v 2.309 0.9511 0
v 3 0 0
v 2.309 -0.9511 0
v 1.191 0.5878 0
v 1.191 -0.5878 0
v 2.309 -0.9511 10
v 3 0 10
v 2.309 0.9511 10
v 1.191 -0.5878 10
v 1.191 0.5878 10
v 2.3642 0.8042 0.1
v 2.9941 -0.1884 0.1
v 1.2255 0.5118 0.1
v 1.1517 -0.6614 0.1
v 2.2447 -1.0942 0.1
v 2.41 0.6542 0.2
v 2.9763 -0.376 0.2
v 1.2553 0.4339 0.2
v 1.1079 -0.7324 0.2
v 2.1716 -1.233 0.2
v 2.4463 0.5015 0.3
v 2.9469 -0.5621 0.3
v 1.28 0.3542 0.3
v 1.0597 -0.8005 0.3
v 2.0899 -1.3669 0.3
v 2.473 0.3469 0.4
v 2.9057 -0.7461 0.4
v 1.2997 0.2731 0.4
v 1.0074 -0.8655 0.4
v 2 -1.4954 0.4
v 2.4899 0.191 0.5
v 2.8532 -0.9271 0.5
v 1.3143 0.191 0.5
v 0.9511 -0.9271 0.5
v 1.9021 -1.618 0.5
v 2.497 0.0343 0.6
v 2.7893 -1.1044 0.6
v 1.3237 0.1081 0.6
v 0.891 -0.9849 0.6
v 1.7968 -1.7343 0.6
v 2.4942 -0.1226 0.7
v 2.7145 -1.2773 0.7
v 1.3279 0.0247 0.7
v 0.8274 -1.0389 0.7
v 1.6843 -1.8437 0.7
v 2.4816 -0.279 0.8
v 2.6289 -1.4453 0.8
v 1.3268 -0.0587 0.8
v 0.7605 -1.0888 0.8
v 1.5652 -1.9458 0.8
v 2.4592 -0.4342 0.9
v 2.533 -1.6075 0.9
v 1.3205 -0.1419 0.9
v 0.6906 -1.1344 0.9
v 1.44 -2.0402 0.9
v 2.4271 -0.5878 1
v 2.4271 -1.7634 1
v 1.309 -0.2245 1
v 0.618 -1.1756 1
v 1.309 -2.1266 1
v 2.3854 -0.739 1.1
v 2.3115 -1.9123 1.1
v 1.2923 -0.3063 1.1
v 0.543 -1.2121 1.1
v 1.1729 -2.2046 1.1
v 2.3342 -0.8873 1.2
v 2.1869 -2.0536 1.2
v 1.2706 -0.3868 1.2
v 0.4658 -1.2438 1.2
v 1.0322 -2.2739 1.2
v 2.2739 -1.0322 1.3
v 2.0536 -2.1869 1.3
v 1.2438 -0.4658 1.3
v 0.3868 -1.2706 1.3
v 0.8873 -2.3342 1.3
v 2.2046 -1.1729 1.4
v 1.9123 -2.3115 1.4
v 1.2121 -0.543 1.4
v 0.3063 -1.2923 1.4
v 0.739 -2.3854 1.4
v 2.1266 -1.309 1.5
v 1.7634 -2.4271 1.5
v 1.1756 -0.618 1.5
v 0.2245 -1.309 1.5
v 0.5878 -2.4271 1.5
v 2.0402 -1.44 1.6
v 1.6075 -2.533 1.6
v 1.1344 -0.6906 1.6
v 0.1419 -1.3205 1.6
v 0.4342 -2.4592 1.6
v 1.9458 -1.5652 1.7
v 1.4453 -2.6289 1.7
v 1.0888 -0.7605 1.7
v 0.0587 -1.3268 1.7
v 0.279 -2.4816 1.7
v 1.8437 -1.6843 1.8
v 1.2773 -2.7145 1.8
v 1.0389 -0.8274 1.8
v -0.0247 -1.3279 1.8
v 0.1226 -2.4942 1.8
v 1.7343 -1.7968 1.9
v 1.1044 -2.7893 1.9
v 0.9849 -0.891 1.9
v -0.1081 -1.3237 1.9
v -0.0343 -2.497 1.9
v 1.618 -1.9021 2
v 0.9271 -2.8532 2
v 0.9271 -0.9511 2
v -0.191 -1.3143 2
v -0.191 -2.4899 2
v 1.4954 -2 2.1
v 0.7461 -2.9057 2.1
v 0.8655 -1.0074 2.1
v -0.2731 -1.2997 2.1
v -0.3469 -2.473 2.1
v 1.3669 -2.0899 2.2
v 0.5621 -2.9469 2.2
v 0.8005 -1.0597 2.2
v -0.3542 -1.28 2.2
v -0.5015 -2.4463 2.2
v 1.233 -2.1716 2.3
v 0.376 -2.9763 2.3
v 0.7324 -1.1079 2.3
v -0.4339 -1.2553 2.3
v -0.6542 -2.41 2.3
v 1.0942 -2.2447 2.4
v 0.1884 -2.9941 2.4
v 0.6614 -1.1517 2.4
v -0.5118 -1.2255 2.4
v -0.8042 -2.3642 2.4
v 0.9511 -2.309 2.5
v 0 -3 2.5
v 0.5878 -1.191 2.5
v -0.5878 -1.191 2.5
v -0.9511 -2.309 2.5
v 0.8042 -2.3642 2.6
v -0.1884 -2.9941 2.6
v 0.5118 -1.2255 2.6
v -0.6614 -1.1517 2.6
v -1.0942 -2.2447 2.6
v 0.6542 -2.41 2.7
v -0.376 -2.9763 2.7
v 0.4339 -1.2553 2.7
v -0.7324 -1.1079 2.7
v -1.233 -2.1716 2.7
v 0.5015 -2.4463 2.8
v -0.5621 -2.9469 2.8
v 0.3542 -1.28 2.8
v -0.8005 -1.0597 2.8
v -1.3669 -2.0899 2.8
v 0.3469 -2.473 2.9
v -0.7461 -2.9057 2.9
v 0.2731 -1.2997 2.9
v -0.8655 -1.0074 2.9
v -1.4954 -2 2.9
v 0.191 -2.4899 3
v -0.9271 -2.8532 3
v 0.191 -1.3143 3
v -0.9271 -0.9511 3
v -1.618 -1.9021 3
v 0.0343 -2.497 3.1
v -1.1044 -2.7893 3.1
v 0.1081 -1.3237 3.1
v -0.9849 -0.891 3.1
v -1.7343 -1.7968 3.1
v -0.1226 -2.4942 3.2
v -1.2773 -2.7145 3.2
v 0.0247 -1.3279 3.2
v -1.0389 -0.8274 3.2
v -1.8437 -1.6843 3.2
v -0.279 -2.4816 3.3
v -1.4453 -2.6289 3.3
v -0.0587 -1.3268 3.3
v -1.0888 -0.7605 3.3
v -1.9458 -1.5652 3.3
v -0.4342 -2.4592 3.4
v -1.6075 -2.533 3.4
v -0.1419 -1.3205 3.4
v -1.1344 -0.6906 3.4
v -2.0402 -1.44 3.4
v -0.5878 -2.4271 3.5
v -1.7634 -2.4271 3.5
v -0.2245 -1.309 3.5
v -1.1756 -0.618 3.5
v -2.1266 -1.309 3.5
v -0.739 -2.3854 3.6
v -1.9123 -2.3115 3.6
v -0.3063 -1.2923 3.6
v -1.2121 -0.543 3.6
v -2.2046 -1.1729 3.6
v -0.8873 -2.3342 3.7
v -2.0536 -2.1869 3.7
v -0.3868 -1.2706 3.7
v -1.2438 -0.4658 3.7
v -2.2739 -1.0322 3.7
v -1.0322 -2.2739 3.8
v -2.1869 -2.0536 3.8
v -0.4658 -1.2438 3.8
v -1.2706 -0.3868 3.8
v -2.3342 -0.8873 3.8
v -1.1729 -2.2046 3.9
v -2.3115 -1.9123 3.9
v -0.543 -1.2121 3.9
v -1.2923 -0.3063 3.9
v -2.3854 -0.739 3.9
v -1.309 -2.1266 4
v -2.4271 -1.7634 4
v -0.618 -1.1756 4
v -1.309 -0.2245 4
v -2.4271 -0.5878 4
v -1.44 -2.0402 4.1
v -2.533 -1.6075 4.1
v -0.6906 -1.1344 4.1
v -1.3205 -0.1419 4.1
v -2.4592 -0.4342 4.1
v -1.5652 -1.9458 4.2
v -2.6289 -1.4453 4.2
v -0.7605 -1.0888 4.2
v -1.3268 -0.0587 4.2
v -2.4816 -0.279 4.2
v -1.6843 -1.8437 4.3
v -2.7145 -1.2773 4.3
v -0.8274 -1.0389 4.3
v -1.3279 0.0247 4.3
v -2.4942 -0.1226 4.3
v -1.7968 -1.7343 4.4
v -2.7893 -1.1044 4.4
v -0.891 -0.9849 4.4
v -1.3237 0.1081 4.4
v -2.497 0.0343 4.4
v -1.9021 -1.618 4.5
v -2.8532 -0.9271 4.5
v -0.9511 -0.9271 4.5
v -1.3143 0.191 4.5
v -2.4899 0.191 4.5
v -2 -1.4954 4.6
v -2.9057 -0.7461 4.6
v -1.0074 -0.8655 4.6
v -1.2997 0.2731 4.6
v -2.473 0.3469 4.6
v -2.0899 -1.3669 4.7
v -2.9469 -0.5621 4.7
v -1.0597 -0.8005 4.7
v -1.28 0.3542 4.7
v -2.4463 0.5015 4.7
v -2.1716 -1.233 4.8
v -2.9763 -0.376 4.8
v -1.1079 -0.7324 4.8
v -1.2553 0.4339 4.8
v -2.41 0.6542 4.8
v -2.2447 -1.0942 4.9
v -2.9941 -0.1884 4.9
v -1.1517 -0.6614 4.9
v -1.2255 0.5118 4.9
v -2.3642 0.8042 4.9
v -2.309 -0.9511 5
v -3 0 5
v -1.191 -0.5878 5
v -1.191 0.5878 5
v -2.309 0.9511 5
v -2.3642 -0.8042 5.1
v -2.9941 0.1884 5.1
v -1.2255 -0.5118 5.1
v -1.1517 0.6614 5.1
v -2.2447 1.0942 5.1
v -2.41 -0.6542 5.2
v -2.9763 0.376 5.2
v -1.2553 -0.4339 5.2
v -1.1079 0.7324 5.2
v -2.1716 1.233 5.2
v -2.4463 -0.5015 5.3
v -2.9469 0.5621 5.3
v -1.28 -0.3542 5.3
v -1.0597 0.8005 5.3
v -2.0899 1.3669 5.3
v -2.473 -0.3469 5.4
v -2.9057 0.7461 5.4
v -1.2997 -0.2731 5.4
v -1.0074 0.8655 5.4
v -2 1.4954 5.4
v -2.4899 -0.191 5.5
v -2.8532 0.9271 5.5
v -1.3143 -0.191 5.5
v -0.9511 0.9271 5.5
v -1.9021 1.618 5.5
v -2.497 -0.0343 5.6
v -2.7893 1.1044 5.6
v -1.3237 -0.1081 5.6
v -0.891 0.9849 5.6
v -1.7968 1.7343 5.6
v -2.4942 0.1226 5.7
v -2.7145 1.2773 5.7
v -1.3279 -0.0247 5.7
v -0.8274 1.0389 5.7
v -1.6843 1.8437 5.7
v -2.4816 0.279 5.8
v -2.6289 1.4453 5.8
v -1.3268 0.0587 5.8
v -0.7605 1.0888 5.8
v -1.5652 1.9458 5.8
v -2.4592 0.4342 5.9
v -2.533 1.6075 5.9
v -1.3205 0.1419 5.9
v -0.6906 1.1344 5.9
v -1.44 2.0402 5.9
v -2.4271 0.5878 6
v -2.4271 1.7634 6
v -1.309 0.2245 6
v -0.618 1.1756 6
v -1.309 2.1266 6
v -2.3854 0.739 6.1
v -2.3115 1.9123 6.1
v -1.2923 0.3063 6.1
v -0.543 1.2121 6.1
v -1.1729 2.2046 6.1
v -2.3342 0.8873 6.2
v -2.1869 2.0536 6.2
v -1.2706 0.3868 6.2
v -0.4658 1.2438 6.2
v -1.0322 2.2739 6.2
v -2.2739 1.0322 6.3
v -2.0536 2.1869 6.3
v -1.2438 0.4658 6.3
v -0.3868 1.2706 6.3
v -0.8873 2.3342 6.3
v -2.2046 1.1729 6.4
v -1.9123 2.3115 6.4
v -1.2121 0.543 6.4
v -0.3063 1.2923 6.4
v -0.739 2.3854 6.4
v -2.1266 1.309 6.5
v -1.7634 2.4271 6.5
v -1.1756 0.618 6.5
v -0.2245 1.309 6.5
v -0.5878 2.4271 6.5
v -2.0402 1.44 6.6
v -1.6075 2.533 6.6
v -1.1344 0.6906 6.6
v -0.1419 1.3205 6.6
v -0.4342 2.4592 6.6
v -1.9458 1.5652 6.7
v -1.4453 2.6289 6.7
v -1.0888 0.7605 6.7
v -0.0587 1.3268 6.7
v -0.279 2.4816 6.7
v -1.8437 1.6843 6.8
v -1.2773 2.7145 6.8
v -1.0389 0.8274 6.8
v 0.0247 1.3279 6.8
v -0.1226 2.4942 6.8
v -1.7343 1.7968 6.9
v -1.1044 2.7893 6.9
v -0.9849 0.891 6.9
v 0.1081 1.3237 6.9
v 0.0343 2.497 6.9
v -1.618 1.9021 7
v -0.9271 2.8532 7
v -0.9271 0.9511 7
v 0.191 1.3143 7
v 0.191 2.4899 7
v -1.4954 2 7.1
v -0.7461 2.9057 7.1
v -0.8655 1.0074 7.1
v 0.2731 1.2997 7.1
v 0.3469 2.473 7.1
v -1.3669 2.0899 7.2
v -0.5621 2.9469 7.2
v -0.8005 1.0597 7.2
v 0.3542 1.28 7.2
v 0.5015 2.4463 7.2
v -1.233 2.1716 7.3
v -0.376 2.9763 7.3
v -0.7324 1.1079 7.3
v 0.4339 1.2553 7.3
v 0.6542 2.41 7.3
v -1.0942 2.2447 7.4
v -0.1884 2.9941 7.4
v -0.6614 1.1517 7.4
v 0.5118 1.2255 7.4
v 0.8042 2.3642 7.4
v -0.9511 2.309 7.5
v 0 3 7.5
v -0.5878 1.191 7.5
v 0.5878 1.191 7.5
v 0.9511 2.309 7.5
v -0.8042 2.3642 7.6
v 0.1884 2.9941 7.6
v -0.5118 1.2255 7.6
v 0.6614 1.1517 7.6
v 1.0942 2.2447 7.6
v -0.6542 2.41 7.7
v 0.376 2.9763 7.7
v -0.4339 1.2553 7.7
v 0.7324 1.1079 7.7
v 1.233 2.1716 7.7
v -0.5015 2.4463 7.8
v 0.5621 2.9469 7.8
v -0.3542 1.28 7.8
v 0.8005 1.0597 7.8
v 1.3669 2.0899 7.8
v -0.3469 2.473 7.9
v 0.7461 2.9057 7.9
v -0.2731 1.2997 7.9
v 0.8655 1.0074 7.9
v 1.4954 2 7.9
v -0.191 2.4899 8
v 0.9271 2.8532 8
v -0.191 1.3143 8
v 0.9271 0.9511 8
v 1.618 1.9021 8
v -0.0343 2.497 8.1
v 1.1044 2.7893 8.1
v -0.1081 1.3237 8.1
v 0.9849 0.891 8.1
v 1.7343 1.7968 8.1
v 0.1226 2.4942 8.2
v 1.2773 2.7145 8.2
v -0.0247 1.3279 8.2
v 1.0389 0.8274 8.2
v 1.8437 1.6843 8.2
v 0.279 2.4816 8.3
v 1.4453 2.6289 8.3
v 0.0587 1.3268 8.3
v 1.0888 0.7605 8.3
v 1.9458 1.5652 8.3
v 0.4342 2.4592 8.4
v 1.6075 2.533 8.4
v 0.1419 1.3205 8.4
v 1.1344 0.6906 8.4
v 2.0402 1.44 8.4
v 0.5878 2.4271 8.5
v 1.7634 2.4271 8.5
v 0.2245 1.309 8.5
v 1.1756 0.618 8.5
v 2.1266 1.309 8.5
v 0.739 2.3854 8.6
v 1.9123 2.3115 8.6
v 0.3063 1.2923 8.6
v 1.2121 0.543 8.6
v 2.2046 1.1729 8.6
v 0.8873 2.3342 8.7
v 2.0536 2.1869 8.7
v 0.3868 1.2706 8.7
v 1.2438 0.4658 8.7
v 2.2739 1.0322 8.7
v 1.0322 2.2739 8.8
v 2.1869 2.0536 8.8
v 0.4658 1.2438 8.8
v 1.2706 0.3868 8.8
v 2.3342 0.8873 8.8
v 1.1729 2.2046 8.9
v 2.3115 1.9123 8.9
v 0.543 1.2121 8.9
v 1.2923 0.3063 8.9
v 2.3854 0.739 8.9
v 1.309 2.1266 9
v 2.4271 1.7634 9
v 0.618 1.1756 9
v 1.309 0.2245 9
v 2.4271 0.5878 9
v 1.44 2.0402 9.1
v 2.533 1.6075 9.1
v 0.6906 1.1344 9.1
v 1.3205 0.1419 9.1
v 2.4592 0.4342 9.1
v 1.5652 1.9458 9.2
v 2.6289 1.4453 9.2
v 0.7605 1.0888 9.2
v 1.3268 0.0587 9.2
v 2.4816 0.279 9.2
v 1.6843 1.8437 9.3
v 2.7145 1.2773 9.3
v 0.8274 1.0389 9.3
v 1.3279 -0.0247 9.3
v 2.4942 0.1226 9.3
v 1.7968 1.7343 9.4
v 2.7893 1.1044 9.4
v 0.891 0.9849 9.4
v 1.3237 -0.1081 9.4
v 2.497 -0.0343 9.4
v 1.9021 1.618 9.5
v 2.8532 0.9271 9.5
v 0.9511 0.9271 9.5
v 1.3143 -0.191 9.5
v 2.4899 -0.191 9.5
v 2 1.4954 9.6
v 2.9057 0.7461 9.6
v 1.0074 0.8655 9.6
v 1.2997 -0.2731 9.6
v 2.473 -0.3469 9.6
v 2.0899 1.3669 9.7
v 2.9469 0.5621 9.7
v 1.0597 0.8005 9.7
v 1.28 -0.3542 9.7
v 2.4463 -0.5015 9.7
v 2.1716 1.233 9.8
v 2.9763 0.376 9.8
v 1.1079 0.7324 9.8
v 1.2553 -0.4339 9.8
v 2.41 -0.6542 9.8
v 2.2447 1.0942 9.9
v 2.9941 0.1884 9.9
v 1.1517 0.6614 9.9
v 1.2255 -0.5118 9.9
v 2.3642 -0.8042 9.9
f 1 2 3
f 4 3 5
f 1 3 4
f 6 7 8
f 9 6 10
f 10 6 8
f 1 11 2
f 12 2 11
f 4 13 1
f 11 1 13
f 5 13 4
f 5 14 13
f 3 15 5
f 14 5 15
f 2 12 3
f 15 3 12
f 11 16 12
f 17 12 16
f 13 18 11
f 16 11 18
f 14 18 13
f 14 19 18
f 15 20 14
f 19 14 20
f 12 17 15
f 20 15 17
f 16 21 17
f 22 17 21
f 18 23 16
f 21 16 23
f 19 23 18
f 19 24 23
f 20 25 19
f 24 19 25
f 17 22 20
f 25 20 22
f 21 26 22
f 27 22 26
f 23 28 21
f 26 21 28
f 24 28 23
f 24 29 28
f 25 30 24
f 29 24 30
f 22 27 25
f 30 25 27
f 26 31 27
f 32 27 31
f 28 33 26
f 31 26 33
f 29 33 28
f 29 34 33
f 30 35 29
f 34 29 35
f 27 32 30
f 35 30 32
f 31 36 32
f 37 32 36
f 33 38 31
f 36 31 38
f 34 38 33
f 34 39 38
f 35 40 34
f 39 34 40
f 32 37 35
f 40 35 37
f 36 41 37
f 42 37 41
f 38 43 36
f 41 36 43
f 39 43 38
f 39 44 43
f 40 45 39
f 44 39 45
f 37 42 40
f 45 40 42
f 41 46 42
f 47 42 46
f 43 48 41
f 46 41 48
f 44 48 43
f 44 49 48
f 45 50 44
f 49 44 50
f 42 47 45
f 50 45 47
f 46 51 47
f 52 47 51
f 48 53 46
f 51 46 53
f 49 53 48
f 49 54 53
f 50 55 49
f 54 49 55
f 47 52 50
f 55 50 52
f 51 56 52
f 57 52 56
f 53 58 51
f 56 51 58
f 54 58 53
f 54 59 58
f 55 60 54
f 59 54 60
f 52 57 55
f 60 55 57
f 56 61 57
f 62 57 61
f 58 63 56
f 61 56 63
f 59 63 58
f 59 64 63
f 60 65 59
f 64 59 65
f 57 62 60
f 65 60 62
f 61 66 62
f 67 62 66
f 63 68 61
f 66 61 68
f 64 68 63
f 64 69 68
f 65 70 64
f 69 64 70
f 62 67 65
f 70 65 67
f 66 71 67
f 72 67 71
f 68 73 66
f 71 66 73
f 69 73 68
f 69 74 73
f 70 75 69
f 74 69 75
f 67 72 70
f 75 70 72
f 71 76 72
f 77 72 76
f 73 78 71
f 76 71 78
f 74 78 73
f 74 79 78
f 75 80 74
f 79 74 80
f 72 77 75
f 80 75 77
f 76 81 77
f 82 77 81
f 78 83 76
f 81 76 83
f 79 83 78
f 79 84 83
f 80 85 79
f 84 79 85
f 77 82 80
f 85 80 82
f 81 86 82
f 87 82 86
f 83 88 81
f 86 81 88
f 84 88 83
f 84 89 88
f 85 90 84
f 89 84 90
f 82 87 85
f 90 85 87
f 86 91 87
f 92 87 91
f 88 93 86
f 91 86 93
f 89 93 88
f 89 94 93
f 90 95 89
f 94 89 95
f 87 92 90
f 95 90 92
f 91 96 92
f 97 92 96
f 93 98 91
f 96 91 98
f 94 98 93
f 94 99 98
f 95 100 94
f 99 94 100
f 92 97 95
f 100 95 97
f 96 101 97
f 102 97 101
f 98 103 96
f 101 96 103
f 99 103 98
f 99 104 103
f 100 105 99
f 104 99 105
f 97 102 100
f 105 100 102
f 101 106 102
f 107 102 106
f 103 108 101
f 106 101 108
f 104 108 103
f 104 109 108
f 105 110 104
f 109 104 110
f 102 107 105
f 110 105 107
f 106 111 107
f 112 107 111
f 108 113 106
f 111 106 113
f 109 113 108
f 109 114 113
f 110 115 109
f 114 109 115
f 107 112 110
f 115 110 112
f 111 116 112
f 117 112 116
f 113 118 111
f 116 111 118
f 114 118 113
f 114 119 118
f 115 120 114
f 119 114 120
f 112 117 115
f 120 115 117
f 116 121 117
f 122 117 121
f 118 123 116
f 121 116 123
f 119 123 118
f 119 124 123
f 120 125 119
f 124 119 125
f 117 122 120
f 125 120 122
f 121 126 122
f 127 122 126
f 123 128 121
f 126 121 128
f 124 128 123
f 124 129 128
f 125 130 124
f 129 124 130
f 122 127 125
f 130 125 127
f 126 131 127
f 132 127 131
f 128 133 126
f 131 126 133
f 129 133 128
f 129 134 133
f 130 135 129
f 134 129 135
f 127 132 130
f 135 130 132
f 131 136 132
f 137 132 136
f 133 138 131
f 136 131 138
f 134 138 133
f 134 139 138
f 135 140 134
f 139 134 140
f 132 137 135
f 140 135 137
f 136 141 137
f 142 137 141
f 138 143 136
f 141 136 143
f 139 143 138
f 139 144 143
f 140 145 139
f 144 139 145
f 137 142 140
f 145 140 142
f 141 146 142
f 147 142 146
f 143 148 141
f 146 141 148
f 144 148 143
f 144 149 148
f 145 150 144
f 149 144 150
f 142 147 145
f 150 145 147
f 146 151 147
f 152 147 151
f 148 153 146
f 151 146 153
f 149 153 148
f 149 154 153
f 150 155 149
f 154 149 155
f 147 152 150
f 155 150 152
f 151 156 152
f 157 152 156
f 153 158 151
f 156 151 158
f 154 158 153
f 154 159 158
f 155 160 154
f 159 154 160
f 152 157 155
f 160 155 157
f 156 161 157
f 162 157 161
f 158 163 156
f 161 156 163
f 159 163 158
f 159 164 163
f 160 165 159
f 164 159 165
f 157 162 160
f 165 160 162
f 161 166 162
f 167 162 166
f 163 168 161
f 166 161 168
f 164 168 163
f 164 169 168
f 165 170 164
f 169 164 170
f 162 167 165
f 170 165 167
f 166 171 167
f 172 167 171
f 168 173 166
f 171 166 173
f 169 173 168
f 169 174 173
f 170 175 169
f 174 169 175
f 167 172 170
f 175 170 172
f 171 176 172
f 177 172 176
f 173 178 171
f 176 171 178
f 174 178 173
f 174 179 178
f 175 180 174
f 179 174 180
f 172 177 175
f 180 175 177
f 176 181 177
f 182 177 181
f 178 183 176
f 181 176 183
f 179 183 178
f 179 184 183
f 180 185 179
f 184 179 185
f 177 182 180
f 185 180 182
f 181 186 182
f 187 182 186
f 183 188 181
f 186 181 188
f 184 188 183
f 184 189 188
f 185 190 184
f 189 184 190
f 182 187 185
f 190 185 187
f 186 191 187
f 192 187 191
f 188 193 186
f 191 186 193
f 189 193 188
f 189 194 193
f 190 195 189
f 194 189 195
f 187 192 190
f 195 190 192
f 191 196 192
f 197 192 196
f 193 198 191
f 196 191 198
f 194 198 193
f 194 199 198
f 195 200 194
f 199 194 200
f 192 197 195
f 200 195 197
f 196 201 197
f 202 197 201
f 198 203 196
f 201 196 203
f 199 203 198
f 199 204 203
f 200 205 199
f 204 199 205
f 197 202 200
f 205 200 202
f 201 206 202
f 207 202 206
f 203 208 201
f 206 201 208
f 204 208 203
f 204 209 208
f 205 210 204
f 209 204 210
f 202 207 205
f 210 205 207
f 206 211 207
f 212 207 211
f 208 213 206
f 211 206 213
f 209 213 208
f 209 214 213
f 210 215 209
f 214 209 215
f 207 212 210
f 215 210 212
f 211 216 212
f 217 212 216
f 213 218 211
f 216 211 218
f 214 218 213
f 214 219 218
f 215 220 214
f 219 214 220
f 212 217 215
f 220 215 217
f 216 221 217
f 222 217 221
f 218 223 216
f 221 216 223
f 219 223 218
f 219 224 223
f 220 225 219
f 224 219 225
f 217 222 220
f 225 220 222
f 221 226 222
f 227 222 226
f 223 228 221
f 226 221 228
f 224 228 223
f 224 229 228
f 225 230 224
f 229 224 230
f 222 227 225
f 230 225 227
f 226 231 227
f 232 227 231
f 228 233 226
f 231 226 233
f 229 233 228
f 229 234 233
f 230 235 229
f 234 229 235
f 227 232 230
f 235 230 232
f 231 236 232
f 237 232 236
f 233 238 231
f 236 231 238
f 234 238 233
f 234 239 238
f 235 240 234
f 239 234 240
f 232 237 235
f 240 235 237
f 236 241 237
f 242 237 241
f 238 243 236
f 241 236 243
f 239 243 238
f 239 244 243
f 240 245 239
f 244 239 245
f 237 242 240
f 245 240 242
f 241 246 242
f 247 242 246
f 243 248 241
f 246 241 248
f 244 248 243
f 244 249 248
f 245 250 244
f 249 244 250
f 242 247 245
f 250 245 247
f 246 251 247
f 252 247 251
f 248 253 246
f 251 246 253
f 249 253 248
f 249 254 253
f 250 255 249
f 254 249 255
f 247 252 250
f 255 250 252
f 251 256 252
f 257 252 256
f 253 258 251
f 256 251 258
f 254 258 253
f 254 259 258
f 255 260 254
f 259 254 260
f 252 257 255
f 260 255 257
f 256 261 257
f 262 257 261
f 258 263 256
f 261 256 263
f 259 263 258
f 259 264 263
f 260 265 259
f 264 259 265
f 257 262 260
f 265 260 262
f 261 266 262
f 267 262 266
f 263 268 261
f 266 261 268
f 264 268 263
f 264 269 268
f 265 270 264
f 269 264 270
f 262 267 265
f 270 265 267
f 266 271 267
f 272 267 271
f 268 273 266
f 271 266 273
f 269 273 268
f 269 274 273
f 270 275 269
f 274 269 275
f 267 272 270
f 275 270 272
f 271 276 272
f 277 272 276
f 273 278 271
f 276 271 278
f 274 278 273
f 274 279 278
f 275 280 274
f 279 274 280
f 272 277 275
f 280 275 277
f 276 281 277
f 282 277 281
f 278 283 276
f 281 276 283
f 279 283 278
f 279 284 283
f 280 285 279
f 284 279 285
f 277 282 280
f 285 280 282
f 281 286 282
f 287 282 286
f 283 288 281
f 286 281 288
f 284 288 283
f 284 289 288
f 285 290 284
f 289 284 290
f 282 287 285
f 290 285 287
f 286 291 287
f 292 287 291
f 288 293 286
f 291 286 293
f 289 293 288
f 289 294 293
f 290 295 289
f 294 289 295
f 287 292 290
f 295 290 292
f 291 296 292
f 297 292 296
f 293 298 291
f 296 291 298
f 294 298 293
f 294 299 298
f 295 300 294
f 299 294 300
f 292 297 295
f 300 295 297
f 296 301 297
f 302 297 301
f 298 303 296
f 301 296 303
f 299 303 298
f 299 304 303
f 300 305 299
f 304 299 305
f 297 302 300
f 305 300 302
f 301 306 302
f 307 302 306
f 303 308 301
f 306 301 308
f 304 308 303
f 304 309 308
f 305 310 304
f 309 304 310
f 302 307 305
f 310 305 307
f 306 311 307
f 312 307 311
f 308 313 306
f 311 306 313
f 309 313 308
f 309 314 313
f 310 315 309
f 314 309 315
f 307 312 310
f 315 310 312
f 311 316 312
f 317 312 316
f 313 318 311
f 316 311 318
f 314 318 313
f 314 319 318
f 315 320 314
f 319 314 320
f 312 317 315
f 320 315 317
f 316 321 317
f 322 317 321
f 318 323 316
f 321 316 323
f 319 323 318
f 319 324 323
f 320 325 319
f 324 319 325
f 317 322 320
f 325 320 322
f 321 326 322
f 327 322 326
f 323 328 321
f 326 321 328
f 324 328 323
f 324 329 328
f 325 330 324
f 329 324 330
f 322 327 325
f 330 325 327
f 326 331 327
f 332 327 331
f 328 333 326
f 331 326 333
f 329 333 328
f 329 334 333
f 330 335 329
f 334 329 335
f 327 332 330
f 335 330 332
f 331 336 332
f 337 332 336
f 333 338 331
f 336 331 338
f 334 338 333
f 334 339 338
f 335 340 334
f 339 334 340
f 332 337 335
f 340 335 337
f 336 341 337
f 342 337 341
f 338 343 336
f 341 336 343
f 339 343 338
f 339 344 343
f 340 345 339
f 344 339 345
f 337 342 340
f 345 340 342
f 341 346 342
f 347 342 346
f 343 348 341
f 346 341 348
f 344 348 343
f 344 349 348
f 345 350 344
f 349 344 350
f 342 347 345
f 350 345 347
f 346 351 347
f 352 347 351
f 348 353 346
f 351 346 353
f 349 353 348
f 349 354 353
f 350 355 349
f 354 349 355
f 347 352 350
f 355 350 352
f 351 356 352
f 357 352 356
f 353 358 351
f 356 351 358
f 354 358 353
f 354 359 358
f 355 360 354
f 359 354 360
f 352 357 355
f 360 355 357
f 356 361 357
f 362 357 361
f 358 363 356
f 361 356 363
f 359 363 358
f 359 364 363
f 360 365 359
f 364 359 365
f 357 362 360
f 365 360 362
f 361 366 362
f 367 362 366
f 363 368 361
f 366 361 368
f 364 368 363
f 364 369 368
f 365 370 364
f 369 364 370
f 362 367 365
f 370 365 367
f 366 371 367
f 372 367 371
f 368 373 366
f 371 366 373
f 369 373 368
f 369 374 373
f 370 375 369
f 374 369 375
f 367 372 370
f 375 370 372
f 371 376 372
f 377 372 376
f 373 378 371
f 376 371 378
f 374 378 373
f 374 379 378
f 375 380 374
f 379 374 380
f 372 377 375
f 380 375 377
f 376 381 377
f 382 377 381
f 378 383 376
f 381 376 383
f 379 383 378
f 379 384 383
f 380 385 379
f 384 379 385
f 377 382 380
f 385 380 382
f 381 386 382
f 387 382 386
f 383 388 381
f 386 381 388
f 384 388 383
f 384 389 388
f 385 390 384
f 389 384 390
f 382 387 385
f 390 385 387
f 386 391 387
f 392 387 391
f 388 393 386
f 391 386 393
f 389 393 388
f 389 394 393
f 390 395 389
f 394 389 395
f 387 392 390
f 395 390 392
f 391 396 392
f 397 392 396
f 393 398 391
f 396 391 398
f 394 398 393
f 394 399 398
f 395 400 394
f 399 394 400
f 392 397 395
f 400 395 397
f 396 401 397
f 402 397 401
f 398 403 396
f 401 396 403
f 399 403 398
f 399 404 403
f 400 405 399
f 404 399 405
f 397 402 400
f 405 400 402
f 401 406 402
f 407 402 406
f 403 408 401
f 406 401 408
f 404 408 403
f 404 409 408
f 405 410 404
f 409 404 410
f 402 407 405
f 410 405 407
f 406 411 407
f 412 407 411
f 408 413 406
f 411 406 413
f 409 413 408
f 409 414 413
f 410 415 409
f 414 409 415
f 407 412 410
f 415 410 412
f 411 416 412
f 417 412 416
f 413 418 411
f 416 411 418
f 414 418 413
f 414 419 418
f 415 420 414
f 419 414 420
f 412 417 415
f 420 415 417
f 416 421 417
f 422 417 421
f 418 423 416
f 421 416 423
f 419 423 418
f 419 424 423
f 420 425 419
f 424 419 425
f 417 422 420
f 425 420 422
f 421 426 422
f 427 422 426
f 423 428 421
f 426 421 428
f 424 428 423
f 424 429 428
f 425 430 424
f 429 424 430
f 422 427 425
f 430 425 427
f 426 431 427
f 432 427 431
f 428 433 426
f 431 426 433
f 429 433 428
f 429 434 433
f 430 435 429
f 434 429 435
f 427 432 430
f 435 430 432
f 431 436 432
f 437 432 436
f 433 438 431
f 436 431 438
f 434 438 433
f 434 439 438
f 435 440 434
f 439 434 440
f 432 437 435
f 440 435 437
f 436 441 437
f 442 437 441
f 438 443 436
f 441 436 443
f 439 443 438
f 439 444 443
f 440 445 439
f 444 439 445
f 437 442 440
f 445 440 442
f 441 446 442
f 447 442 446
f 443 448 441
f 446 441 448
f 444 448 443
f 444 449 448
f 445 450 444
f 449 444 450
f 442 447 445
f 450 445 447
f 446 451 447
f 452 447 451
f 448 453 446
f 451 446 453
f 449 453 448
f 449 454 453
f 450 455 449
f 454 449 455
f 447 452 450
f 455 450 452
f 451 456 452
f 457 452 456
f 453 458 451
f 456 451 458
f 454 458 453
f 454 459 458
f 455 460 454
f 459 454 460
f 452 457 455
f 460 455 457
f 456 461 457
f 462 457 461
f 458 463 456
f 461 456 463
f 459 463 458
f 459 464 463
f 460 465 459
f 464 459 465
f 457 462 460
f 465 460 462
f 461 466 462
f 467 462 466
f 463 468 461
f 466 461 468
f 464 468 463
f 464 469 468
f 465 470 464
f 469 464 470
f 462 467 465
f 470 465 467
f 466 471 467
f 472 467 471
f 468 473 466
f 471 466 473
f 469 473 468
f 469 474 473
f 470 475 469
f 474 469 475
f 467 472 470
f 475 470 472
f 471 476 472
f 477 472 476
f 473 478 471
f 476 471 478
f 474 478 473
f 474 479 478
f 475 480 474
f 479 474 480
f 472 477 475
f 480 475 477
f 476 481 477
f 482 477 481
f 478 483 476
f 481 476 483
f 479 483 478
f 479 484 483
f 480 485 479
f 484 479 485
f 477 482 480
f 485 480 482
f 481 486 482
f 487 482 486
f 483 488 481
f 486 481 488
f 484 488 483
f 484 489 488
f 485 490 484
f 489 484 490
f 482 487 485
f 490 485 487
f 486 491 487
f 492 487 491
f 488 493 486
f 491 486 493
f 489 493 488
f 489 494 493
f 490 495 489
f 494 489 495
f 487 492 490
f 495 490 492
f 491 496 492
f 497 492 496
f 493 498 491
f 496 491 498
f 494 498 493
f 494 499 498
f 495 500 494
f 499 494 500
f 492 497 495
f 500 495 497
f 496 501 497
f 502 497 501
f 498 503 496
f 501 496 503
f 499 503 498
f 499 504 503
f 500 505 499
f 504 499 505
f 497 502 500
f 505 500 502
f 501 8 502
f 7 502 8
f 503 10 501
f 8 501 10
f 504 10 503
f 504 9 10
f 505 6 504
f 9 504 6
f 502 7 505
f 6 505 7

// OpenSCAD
// Unit of length: Unit.MM
linear_extrude(height = 10.0, center = false, convexity = 10, twist = 360.0, scale = 1.0, slices = 100)
{
   translate(v = [2.0, 0.0])
   {
      circle(d = 2.0);
   }
}
